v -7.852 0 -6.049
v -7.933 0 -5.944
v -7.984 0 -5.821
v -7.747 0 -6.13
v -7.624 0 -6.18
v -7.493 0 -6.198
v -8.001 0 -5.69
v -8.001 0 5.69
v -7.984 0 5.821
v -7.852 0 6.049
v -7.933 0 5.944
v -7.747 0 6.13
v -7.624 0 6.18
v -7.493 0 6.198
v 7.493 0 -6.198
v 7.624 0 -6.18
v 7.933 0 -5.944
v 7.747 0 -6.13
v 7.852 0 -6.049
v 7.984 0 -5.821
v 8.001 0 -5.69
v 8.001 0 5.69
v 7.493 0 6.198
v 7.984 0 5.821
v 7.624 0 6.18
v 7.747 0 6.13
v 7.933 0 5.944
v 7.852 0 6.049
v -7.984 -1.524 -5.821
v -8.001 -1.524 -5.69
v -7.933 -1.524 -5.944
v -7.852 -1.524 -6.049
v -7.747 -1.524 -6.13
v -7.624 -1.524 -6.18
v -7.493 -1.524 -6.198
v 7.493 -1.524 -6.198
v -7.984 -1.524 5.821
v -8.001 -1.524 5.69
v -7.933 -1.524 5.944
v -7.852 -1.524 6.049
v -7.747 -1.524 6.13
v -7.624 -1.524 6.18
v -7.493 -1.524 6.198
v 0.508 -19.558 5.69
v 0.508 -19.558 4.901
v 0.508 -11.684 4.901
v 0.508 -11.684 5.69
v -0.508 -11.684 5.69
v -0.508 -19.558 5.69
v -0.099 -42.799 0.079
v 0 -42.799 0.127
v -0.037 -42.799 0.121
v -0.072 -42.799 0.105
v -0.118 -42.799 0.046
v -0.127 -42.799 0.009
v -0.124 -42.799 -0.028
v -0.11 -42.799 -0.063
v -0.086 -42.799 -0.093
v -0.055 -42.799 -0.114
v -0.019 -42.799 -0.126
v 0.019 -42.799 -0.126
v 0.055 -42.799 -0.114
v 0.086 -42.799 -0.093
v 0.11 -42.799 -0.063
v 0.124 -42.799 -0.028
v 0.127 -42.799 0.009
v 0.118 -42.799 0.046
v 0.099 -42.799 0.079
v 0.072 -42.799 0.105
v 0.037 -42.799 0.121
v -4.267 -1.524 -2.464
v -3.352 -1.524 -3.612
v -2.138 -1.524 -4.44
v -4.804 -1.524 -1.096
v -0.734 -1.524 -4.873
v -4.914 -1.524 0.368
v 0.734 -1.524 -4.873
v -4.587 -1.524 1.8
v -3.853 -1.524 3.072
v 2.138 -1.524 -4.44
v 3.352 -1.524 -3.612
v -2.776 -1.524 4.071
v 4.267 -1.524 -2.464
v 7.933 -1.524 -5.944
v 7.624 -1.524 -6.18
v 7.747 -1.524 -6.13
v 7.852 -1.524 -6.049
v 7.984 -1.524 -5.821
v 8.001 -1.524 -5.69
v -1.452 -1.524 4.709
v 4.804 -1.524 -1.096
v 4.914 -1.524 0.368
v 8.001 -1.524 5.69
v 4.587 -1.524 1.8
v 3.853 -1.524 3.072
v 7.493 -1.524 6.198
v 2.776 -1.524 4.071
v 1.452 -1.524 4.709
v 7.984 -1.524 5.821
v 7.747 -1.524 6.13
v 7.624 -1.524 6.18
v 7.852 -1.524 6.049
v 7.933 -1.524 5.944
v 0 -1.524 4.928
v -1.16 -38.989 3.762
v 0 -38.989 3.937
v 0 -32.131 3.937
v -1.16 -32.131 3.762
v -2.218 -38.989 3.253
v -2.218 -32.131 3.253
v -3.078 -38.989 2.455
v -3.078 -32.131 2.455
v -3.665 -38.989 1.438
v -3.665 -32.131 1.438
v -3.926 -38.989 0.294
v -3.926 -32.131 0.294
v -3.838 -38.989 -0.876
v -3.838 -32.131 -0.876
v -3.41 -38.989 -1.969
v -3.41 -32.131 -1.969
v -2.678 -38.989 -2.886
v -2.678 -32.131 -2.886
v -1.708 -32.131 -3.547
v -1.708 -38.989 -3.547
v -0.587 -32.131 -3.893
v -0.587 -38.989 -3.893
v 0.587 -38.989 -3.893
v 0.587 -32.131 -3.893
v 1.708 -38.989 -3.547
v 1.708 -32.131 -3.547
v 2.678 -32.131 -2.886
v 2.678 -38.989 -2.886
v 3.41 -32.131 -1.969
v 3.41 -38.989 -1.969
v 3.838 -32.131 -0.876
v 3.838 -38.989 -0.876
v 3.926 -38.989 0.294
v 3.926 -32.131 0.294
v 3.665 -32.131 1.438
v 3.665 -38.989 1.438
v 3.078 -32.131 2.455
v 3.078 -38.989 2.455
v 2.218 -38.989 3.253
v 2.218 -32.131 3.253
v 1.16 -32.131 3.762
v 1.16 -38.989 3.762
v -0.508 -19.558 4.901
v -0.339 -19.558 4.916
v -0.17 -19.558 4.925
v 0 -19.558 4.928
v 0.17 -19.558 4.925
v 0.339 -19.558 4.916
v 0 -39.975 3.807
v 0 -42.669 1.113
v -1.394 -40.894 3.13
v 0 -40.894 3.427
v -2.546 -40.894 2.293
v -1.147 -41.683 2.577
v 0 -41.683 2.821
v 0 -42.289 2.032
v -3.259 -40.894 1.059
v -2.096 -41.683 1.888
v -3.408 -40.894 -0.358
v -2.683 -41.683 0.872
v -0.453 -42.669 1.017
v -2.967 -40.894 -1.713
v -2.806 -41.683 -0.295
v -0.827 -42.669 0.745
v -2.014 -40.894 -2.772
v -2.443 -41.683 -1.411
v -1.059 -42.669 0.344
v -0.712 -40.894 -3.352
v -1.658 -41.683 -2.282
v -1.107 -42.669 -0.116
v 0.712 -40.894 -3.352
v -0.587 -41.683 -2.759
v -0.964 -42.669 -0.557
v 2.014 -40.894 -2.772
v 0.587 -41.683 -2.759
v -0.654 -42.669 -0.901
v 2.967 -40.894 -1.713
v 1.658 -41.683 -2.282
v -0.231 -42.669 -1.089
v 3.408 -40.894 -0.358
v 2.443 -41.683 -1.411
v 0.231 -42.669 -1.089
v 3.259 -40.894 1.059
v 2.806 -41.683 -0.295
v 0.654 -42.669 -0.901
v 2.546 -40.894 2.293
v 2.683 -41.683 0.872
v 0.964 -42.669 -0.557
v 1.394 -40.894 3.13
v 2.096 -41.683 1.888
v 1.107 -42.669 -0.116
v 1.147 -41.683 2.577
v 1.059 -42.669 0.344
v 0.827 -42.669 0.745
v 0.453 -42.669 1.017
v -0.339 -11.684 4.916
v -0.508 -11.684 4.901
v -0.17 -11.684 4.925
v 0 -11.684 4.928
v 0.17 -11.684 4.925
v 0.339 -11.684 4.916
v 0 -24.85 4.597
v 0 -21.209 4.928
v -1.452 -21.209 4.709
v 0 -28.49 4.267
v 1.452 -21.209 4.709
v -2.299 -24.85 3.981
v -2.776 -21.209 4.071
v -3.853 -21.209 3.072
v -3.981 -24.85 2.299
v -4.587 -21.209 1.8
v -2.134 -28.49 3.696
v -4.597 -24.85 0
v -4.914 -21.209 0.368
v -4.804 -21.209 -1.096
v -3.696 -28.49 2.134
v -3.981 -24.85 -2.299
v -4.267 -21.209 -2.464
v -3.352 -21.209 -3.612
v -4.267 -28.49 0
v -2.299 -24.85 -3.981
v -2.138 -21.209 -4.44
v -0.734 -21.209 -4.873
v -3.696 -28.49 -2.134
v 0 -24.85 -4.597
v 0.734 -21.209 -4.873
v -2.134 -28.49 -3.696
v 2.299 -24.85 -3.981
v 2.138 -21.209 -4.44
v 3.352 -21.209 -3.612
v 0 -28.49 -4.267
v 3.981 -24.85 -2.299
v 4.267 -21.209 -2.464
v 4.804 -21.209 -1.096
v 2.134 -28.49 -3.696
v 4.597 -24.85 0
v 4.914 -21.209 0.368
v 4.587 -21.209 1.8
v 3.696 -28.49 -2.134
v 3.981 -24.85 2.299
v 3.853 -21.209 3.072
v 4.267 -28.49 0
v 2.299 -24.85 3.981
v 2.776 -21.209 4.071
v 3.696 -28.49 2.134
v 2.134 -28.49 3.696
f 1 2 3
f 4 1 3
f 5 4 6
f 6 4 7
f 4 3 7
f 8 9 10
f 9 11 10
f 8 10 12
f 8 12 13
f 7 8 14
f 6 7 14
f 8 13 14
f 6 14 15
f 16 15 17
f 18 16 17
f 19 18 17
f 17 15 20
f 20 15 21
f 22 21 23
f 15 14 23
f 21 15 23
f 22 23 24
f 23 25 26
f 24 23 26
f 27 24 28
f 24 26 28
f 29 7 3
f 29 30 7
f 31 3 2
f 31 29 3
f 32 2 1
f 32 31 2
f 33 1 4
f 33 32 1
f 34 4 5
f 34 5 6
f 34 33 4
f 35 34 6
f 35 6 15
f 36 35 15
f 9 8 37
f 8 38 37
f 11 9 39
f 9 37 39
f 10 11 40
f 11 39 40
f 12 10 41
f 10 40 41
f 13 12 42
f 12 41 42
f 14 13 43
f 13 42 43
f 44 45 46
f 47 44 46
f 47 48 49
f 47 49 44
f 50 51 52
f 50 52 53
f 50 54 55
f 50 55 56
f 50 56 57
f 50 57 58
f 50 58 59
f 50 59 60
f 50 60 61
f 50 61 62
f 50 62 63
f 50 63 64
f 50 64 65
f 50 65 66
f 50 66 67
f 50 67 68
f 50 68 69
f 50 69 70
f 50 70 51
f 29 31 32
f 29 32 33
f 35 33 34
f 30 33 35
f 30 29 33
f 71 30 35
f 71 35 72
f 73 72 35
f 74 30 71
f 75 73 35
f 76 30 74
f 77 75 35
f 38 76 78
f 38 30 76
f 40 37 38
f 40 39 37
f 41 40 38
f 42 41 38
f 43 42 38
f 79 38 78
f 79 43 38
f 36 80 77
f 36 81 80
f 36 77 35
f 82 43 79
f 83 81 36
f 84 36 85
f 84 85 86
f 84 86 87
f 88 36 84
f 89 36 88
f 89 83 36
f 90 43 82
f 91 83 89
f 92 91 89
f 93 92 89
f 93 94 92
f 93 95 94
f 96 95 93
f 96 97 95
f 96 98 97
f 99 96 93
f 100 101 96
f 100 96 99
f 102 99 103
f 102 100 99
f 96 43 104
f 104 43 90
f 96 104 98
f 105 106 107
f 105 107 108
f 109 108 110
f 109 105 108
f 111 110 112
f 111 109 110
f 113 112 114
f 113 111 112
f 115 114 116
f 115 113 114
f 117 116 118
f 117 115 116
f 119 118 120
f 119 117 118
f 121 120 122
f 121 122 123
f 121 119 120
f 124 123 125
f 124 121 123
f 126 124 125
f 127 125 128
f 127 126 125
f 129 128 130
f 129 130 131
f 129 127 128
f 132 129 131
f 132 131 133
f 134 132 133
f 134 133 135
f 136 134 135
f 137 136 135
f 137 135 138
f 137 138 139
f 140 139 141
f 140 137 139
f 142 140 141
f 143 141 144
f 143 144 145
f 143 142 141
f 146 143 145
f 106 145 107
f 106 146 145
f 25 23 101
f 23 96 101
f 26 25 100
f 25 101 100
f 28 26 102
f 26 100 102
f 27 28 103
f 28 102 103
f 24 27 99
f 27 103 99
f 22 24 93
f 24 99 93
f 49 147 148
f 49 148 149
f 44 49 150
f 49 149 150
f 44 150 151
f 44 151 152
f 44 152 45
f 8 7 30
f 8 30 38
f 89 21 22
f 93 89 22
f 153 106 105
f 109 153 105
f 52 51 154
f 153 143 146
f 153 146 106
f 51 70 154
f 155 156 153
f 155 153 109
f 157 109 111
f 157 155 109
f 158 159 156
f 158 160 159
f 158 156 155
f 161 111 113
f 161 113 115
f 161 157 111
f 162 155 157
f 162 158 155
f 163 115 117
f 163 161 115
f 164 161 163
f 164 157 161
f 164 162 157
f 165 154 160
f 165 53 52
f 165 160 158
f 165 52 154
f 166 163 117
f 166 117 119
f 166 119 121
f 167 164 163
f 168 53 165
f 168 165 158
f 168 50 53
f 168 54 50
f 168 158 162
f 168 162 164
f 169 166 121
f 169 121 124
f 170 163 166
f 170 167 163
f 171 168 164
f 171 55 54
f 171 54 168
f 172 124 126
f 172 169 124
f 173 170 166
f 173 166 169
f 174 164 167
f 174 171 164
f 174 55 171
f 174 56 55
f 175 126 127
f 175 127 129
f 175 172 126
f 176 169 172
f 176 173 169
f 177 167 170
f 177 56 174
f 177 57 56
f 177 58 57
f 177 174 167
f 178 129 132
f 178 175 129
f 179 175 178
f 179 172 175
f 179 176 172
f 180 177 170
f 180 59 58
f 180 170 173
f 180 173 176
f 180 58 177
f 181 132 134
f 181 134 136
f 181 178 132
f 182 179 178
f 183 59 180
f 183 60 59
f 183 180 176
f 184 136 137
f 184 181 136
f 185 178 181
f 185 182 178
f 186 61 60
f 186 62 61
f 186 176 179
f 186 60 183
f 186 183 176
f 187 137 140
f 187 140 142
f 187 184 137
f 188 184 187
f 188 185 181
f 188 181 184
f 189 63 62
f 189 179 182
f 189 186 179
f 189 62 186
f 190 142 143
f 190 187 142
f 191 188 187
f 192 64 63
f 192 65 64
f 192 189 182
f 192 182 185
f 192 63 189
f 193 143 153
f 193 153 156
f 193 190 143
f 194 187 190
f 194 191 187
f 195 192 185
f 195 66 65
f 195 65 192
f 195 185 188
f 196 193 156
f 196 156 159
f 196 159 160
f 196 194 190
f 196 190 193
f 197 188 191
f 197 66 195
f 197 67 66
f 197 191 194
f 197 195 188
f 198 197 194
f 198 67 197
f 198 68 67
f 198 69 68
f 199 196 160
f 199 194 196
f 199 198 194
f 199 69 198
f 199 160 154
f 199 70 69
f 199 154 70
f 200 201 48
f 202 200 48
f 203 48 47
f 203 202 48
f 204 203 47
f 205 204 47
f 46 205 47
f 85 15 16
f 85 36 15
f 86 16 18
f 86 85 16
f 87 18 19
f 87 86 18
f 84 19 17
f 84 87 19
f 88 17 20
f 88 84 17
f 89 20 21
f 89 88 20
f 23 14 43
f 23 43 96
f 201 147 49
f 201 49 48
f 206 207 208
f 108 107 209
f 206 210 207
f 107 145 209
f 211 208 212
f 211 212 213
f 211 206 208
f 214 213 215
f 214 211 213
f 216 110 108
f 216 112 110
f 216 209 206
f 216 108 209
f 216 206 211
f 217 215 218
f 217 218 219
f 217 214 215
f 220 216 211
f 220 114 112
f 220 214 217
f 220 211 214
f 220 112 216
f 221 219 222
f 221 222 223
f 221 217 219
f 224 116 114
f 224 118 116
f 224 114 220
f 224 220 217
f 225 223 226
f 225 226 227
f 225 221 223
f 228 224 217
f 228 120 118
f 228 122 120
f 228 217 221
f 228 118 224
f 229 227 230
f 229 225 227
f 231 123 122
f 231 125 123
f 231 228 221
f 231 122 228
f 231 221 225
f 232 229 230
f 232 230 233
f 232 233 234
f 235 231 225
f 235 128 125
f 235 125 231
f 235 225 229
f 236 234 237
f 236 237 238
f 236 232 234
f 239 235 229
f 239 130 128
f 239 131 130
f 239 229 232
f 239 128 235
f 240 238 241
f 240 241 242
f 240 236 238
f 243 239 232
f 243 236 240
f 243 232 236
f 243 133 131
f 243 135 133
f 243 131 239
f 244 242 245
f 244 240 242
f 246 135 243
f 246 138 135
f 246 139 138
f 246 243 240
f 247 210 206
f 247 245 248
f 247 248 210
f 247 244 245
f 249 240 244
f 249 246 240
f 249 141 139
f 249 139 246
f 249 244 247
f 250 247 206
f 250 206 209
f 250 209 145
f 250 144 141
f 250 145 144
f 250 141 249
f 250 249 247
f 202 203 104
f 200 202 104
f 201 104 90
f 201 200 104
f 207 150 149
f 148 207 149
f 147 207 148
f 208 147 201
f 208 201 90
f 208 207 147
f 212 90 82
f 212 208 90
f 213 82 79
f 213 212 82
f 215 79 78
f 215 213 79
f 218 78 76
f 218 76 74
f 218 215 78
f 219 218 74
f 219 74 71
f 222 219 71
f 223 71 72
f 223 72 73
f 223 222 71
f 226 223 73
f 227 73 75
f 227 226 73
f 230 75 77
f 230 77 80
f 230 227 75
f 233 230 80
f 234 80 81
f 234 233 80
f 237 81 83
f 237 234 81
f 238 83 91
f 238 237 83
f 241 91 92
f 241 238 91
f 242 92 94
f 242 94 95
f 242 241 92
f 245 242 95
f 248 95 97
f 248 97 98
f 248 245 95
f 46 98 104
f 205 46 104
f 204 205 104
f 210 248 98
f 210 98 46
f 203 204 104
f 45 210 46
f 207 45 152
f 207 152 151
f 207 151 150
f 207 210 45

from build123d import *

# Parameters (mm, degrees)
F3_W     = 16.002
F3_H     = 12.3952
F4_DEPTH = 1.524
F1_R     = 3.81
F6_R     = 0.508
F7_W     = 1.016
F7_H     = 7.874
F2_DEPTH = 5.6896


with BuildPart() as f4:
    # F3 (on Front) → F4 (new body)
    with BuildSketch(Plane.XZ):
        Rectangle(F3_W, F3_H)
    extrude(amount=F4_DEPTH)

    # F0 (on Right) → F5 (revolve)
    with BuildSketch(Plane.YZ):
        Polygon((-42.799, 0), (-1.524, 0), (-1.524, 4.9276), (-21.209, 4.9276), (-32.131, 3.937), (-42.799, 3.937), align=None)
    revolve(axis=Axis((0, -21.3995, 0), (0, -1, 0)))

    # F1
    f1_edges = [f4.edges().sort_by_distance(p)[0] for p in [
        (0, -42.799, -3.937),
    ]]
    fillet(f1_edges, radius=F1_R)

    # F6
    f6_edges = [f4.edges().sort_by_distance(p)[0] for p in [
        (8.001, -0.762, 6.1976),
        (-8.001, -0.762, 6.1976),
        (-8.001, -0.762, -6.1976),
        (8.001, -0.762, -6.1976),
    ]]
    fillet(f6_edges, radius=F6_R)

    # F7 (on Top) → F2 (join)
    with BuildSketch(Plane.XY):
        with Locations((0, -15.621)):
            Rectangle(F7_W, F7_H)
    extrude(amount=F2_DEPTH)


solid = f4.part
